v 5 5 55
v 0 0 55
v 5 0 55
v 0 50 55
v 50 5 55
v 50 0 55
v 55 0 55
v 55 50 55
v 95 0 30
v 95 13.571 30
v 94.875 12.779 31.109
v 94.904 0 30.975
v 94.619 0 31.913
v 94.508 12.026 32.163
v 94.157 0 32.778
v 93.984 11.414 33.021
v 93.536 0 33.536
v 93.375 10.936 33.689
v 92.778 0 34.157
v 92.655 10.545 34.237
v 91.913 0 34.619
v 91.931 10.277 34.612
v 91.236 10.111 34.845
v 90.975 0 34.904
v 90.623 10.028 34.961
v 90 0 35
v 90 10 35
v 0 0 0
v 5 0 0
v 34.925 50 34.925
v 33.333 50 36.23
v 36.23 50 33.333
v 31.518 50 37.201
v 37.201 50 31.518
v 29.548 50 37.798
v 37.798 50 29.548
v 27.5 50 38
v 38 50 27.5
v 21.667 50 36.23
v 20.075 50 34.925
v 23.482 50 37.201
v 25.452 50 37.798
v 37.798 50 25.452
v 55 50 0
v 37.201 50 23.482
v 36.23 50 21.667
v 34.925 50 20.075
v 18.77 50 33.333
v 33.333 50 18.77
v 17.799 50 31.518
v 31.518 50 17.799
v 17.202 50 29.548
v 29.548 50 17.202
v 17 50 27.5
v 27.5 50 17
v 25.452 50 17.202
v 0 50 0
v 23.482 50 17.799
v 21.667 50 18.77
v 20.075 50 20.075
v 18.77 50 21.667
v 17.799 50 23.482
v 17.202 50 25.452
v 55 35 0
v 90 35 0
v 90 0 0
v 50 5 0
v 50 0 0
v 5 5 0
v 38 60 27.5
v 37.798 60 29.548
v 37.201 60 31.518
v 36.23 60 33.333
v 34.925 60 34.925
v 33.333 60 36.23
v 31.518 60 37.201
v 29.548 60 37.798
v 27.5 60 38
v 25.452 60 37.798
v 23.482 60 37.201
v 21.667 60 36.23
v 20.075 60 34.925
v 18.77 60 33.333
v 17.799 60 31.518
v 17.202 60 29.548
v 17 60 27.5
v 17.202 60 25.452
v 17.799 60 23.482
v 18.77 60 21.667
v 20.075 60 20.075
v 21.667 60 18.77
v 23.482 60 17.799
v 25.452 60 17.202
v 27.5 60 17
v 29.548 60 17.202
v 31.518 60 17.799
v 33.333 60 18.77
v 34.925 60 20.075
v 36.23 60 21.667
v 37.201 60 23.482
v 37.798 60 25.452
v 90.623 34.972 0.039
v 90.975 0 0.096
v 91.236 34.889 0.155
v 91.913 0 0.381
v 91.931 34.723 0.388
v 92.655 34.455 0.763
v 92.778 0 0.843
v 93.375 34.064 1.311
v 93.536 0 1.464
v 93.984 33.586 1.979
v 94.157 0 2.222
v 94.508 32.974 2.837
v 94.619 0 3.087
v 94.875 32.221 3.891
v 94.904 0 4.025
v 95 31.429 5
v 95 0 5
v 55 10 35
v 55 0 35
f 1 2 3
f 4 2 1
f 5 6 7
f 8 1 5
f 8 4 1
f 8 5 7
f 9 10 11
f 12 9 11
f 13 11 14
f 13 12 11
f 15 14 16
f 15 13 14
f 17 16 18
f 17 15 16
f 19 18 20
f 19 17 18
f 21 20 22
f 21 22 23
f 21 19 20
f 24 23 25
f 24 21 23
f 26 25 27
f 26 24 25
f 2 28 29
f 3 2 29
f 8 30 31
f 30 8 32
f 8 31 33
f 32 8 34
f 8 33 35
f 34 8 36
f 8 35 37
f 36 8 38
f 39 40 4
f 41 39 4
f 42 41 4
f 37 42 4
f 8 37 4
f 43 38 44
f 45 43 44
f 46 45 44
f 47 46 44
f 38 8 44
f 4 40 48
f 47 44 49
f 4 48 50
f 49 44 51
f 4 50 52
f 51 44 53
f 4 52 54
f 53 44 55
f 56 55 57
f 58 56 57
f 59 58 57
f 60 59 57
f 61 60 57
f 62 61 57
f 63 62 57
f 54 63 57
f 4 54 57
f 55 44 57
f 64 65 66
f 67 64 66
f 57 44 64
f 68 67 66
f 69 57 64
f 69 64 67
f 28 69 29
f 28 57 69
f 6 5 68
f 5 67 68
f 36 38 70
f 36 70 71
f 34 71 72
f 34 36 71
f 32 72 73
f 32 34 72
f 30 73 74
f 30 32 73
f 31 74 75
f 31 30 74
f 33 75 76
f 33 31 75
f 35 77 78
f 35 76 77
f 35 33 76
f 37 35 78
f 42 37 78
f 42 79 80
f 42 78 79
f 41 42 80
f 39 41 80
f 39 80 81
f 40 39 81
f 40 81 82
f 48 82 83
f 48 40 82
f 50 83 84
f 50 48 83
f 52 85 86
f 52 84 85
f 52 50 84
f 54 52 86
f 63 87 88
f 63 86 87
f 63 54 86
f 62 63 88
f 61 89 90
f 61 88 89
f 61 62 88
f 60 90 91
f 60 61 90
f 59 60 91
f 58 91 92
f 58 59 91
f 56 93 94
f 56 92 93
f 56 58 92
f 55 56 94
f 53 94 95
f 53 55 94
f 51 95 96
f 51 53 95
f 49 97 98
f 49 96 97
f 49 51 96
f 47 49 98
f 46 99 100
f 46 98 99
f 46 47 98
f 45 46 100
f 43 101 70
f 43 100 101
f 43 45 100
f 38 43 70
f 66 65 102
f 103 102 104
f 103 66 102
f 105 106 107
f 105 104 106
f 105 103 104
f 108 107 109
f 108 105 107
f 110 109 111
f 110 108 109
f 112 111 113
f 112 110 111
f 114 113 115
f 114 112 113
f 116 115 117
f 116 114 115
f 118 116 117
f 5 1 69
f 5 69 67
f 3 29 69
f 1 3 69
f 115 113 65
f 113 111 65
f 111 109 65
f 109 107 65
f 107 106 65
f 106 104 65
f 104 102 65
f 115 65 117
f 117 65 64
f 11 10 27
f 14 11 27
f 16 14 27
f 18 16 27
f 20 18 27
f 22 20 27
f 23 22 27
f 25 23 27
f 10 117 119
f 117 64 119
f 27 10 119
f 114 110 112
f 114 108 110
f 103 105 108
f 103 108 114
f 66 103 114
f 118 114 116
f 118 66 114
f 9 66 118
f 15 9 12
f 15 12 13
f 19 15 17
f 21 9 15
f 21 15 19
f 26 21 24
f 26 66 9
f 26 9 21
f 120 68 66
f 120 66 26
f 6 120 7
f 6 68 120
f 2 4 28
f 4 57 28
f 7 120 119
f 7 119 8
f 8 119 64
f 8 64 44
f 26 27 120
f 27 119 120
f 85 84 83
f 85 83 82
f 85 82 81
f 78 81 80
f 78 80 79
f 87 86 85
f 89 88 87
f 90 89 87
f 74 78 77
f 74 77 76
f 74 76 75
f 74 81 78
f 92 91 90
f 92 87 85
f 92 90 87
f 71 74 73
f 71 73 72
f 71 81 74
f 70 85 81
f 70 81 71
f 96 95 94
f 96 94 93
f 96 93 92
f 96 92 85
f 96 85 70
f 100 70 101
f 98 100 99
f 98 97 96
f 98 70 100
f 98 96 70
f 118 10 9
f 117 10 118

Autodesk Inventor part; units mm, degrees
ref_plane "YZ Plane" through (0, 0, 0) normal (1, 0, 0) x (0, 1, 0)
ref_plane "XZ Plane" through (0, 0, 0) normal (0, 1, 0) x (-1, 0, 0)
ref_plane "XY Plane" through (0, 0, 0) normal (0, 0, 1) x (1, 0, 0)
sketch "Sketch1" plane through (0, 0, 0) normal (0, 0, 1) x (1, 0, 0)
  line L0 (0, 0) -> (5, 0)
  line L1 (5, 0) -> (5, 5)
  line L2 (5, 5) -> (50, 5)
  line L3 (50, 5) -> (50, 0)
  line L4 (50, 0) -> (55, 0)
  line L5 (55, 0) -> (55, 50)
  line L6 (55, 50) -> (0, 50)
  line L7 (0, 50) -> (0, 0)
  dimension "d0" = 50
  dimension "d1" = 5
  dimension "d2" = 5
  dimension "d3" = 5
  dimension "d4" = 45
extrude "Extrusion1" add sketch "Sketch1" along normal blind 55
sketch "Sketch2" plane through (0, 50, 0) normal (0, 1, 0) x (1, 0, 0)
  circle A0 centre (27.5, -27.5) radius 10.5
  line L0 (55, -55) -> (0, -55) projected
  line L1 (0, 0) -> (0, -55) projected
  dimension "d7" = 21
  dimension "d8" = 27.5
  dimension "d9" = 27.5
extrude "Extrusion2" add sketch "Sketch2" along normal blind 10
sketch "Sketch3" plane through (55, 0, 0) normal (1, 0, 0) x (0, 0, -1)
  line L0 (0, 50) -> (0, 0) projected
  line L1 (0, 0) -> (0, 35)
  line L2 (0, 35) -> (-35, 10)
  line L3 (-35, 10) -> (-35, 0)
  line L4 (0, 0) -> (-55, 0) projected
  line L5 (-35, 0) -> (0, 0)
  line L6 (0, 0) -> (0, 35)
  point P0 (-35, 0)
  dimension "d12" = 35
  dimension "d13" = 0
  dimension "d14" = 10
  dimension "d15" = 35
extrude "Extrusion3" add sketch "Sketch3" along normal blind 40
fillet "Fillet1" radius 5 1 edges at (95, 5, 35)
fillet "Fillet2" radius 5 1 edges at (95, 17.5, 0)
properties part number "khurramf_Graphics2"
